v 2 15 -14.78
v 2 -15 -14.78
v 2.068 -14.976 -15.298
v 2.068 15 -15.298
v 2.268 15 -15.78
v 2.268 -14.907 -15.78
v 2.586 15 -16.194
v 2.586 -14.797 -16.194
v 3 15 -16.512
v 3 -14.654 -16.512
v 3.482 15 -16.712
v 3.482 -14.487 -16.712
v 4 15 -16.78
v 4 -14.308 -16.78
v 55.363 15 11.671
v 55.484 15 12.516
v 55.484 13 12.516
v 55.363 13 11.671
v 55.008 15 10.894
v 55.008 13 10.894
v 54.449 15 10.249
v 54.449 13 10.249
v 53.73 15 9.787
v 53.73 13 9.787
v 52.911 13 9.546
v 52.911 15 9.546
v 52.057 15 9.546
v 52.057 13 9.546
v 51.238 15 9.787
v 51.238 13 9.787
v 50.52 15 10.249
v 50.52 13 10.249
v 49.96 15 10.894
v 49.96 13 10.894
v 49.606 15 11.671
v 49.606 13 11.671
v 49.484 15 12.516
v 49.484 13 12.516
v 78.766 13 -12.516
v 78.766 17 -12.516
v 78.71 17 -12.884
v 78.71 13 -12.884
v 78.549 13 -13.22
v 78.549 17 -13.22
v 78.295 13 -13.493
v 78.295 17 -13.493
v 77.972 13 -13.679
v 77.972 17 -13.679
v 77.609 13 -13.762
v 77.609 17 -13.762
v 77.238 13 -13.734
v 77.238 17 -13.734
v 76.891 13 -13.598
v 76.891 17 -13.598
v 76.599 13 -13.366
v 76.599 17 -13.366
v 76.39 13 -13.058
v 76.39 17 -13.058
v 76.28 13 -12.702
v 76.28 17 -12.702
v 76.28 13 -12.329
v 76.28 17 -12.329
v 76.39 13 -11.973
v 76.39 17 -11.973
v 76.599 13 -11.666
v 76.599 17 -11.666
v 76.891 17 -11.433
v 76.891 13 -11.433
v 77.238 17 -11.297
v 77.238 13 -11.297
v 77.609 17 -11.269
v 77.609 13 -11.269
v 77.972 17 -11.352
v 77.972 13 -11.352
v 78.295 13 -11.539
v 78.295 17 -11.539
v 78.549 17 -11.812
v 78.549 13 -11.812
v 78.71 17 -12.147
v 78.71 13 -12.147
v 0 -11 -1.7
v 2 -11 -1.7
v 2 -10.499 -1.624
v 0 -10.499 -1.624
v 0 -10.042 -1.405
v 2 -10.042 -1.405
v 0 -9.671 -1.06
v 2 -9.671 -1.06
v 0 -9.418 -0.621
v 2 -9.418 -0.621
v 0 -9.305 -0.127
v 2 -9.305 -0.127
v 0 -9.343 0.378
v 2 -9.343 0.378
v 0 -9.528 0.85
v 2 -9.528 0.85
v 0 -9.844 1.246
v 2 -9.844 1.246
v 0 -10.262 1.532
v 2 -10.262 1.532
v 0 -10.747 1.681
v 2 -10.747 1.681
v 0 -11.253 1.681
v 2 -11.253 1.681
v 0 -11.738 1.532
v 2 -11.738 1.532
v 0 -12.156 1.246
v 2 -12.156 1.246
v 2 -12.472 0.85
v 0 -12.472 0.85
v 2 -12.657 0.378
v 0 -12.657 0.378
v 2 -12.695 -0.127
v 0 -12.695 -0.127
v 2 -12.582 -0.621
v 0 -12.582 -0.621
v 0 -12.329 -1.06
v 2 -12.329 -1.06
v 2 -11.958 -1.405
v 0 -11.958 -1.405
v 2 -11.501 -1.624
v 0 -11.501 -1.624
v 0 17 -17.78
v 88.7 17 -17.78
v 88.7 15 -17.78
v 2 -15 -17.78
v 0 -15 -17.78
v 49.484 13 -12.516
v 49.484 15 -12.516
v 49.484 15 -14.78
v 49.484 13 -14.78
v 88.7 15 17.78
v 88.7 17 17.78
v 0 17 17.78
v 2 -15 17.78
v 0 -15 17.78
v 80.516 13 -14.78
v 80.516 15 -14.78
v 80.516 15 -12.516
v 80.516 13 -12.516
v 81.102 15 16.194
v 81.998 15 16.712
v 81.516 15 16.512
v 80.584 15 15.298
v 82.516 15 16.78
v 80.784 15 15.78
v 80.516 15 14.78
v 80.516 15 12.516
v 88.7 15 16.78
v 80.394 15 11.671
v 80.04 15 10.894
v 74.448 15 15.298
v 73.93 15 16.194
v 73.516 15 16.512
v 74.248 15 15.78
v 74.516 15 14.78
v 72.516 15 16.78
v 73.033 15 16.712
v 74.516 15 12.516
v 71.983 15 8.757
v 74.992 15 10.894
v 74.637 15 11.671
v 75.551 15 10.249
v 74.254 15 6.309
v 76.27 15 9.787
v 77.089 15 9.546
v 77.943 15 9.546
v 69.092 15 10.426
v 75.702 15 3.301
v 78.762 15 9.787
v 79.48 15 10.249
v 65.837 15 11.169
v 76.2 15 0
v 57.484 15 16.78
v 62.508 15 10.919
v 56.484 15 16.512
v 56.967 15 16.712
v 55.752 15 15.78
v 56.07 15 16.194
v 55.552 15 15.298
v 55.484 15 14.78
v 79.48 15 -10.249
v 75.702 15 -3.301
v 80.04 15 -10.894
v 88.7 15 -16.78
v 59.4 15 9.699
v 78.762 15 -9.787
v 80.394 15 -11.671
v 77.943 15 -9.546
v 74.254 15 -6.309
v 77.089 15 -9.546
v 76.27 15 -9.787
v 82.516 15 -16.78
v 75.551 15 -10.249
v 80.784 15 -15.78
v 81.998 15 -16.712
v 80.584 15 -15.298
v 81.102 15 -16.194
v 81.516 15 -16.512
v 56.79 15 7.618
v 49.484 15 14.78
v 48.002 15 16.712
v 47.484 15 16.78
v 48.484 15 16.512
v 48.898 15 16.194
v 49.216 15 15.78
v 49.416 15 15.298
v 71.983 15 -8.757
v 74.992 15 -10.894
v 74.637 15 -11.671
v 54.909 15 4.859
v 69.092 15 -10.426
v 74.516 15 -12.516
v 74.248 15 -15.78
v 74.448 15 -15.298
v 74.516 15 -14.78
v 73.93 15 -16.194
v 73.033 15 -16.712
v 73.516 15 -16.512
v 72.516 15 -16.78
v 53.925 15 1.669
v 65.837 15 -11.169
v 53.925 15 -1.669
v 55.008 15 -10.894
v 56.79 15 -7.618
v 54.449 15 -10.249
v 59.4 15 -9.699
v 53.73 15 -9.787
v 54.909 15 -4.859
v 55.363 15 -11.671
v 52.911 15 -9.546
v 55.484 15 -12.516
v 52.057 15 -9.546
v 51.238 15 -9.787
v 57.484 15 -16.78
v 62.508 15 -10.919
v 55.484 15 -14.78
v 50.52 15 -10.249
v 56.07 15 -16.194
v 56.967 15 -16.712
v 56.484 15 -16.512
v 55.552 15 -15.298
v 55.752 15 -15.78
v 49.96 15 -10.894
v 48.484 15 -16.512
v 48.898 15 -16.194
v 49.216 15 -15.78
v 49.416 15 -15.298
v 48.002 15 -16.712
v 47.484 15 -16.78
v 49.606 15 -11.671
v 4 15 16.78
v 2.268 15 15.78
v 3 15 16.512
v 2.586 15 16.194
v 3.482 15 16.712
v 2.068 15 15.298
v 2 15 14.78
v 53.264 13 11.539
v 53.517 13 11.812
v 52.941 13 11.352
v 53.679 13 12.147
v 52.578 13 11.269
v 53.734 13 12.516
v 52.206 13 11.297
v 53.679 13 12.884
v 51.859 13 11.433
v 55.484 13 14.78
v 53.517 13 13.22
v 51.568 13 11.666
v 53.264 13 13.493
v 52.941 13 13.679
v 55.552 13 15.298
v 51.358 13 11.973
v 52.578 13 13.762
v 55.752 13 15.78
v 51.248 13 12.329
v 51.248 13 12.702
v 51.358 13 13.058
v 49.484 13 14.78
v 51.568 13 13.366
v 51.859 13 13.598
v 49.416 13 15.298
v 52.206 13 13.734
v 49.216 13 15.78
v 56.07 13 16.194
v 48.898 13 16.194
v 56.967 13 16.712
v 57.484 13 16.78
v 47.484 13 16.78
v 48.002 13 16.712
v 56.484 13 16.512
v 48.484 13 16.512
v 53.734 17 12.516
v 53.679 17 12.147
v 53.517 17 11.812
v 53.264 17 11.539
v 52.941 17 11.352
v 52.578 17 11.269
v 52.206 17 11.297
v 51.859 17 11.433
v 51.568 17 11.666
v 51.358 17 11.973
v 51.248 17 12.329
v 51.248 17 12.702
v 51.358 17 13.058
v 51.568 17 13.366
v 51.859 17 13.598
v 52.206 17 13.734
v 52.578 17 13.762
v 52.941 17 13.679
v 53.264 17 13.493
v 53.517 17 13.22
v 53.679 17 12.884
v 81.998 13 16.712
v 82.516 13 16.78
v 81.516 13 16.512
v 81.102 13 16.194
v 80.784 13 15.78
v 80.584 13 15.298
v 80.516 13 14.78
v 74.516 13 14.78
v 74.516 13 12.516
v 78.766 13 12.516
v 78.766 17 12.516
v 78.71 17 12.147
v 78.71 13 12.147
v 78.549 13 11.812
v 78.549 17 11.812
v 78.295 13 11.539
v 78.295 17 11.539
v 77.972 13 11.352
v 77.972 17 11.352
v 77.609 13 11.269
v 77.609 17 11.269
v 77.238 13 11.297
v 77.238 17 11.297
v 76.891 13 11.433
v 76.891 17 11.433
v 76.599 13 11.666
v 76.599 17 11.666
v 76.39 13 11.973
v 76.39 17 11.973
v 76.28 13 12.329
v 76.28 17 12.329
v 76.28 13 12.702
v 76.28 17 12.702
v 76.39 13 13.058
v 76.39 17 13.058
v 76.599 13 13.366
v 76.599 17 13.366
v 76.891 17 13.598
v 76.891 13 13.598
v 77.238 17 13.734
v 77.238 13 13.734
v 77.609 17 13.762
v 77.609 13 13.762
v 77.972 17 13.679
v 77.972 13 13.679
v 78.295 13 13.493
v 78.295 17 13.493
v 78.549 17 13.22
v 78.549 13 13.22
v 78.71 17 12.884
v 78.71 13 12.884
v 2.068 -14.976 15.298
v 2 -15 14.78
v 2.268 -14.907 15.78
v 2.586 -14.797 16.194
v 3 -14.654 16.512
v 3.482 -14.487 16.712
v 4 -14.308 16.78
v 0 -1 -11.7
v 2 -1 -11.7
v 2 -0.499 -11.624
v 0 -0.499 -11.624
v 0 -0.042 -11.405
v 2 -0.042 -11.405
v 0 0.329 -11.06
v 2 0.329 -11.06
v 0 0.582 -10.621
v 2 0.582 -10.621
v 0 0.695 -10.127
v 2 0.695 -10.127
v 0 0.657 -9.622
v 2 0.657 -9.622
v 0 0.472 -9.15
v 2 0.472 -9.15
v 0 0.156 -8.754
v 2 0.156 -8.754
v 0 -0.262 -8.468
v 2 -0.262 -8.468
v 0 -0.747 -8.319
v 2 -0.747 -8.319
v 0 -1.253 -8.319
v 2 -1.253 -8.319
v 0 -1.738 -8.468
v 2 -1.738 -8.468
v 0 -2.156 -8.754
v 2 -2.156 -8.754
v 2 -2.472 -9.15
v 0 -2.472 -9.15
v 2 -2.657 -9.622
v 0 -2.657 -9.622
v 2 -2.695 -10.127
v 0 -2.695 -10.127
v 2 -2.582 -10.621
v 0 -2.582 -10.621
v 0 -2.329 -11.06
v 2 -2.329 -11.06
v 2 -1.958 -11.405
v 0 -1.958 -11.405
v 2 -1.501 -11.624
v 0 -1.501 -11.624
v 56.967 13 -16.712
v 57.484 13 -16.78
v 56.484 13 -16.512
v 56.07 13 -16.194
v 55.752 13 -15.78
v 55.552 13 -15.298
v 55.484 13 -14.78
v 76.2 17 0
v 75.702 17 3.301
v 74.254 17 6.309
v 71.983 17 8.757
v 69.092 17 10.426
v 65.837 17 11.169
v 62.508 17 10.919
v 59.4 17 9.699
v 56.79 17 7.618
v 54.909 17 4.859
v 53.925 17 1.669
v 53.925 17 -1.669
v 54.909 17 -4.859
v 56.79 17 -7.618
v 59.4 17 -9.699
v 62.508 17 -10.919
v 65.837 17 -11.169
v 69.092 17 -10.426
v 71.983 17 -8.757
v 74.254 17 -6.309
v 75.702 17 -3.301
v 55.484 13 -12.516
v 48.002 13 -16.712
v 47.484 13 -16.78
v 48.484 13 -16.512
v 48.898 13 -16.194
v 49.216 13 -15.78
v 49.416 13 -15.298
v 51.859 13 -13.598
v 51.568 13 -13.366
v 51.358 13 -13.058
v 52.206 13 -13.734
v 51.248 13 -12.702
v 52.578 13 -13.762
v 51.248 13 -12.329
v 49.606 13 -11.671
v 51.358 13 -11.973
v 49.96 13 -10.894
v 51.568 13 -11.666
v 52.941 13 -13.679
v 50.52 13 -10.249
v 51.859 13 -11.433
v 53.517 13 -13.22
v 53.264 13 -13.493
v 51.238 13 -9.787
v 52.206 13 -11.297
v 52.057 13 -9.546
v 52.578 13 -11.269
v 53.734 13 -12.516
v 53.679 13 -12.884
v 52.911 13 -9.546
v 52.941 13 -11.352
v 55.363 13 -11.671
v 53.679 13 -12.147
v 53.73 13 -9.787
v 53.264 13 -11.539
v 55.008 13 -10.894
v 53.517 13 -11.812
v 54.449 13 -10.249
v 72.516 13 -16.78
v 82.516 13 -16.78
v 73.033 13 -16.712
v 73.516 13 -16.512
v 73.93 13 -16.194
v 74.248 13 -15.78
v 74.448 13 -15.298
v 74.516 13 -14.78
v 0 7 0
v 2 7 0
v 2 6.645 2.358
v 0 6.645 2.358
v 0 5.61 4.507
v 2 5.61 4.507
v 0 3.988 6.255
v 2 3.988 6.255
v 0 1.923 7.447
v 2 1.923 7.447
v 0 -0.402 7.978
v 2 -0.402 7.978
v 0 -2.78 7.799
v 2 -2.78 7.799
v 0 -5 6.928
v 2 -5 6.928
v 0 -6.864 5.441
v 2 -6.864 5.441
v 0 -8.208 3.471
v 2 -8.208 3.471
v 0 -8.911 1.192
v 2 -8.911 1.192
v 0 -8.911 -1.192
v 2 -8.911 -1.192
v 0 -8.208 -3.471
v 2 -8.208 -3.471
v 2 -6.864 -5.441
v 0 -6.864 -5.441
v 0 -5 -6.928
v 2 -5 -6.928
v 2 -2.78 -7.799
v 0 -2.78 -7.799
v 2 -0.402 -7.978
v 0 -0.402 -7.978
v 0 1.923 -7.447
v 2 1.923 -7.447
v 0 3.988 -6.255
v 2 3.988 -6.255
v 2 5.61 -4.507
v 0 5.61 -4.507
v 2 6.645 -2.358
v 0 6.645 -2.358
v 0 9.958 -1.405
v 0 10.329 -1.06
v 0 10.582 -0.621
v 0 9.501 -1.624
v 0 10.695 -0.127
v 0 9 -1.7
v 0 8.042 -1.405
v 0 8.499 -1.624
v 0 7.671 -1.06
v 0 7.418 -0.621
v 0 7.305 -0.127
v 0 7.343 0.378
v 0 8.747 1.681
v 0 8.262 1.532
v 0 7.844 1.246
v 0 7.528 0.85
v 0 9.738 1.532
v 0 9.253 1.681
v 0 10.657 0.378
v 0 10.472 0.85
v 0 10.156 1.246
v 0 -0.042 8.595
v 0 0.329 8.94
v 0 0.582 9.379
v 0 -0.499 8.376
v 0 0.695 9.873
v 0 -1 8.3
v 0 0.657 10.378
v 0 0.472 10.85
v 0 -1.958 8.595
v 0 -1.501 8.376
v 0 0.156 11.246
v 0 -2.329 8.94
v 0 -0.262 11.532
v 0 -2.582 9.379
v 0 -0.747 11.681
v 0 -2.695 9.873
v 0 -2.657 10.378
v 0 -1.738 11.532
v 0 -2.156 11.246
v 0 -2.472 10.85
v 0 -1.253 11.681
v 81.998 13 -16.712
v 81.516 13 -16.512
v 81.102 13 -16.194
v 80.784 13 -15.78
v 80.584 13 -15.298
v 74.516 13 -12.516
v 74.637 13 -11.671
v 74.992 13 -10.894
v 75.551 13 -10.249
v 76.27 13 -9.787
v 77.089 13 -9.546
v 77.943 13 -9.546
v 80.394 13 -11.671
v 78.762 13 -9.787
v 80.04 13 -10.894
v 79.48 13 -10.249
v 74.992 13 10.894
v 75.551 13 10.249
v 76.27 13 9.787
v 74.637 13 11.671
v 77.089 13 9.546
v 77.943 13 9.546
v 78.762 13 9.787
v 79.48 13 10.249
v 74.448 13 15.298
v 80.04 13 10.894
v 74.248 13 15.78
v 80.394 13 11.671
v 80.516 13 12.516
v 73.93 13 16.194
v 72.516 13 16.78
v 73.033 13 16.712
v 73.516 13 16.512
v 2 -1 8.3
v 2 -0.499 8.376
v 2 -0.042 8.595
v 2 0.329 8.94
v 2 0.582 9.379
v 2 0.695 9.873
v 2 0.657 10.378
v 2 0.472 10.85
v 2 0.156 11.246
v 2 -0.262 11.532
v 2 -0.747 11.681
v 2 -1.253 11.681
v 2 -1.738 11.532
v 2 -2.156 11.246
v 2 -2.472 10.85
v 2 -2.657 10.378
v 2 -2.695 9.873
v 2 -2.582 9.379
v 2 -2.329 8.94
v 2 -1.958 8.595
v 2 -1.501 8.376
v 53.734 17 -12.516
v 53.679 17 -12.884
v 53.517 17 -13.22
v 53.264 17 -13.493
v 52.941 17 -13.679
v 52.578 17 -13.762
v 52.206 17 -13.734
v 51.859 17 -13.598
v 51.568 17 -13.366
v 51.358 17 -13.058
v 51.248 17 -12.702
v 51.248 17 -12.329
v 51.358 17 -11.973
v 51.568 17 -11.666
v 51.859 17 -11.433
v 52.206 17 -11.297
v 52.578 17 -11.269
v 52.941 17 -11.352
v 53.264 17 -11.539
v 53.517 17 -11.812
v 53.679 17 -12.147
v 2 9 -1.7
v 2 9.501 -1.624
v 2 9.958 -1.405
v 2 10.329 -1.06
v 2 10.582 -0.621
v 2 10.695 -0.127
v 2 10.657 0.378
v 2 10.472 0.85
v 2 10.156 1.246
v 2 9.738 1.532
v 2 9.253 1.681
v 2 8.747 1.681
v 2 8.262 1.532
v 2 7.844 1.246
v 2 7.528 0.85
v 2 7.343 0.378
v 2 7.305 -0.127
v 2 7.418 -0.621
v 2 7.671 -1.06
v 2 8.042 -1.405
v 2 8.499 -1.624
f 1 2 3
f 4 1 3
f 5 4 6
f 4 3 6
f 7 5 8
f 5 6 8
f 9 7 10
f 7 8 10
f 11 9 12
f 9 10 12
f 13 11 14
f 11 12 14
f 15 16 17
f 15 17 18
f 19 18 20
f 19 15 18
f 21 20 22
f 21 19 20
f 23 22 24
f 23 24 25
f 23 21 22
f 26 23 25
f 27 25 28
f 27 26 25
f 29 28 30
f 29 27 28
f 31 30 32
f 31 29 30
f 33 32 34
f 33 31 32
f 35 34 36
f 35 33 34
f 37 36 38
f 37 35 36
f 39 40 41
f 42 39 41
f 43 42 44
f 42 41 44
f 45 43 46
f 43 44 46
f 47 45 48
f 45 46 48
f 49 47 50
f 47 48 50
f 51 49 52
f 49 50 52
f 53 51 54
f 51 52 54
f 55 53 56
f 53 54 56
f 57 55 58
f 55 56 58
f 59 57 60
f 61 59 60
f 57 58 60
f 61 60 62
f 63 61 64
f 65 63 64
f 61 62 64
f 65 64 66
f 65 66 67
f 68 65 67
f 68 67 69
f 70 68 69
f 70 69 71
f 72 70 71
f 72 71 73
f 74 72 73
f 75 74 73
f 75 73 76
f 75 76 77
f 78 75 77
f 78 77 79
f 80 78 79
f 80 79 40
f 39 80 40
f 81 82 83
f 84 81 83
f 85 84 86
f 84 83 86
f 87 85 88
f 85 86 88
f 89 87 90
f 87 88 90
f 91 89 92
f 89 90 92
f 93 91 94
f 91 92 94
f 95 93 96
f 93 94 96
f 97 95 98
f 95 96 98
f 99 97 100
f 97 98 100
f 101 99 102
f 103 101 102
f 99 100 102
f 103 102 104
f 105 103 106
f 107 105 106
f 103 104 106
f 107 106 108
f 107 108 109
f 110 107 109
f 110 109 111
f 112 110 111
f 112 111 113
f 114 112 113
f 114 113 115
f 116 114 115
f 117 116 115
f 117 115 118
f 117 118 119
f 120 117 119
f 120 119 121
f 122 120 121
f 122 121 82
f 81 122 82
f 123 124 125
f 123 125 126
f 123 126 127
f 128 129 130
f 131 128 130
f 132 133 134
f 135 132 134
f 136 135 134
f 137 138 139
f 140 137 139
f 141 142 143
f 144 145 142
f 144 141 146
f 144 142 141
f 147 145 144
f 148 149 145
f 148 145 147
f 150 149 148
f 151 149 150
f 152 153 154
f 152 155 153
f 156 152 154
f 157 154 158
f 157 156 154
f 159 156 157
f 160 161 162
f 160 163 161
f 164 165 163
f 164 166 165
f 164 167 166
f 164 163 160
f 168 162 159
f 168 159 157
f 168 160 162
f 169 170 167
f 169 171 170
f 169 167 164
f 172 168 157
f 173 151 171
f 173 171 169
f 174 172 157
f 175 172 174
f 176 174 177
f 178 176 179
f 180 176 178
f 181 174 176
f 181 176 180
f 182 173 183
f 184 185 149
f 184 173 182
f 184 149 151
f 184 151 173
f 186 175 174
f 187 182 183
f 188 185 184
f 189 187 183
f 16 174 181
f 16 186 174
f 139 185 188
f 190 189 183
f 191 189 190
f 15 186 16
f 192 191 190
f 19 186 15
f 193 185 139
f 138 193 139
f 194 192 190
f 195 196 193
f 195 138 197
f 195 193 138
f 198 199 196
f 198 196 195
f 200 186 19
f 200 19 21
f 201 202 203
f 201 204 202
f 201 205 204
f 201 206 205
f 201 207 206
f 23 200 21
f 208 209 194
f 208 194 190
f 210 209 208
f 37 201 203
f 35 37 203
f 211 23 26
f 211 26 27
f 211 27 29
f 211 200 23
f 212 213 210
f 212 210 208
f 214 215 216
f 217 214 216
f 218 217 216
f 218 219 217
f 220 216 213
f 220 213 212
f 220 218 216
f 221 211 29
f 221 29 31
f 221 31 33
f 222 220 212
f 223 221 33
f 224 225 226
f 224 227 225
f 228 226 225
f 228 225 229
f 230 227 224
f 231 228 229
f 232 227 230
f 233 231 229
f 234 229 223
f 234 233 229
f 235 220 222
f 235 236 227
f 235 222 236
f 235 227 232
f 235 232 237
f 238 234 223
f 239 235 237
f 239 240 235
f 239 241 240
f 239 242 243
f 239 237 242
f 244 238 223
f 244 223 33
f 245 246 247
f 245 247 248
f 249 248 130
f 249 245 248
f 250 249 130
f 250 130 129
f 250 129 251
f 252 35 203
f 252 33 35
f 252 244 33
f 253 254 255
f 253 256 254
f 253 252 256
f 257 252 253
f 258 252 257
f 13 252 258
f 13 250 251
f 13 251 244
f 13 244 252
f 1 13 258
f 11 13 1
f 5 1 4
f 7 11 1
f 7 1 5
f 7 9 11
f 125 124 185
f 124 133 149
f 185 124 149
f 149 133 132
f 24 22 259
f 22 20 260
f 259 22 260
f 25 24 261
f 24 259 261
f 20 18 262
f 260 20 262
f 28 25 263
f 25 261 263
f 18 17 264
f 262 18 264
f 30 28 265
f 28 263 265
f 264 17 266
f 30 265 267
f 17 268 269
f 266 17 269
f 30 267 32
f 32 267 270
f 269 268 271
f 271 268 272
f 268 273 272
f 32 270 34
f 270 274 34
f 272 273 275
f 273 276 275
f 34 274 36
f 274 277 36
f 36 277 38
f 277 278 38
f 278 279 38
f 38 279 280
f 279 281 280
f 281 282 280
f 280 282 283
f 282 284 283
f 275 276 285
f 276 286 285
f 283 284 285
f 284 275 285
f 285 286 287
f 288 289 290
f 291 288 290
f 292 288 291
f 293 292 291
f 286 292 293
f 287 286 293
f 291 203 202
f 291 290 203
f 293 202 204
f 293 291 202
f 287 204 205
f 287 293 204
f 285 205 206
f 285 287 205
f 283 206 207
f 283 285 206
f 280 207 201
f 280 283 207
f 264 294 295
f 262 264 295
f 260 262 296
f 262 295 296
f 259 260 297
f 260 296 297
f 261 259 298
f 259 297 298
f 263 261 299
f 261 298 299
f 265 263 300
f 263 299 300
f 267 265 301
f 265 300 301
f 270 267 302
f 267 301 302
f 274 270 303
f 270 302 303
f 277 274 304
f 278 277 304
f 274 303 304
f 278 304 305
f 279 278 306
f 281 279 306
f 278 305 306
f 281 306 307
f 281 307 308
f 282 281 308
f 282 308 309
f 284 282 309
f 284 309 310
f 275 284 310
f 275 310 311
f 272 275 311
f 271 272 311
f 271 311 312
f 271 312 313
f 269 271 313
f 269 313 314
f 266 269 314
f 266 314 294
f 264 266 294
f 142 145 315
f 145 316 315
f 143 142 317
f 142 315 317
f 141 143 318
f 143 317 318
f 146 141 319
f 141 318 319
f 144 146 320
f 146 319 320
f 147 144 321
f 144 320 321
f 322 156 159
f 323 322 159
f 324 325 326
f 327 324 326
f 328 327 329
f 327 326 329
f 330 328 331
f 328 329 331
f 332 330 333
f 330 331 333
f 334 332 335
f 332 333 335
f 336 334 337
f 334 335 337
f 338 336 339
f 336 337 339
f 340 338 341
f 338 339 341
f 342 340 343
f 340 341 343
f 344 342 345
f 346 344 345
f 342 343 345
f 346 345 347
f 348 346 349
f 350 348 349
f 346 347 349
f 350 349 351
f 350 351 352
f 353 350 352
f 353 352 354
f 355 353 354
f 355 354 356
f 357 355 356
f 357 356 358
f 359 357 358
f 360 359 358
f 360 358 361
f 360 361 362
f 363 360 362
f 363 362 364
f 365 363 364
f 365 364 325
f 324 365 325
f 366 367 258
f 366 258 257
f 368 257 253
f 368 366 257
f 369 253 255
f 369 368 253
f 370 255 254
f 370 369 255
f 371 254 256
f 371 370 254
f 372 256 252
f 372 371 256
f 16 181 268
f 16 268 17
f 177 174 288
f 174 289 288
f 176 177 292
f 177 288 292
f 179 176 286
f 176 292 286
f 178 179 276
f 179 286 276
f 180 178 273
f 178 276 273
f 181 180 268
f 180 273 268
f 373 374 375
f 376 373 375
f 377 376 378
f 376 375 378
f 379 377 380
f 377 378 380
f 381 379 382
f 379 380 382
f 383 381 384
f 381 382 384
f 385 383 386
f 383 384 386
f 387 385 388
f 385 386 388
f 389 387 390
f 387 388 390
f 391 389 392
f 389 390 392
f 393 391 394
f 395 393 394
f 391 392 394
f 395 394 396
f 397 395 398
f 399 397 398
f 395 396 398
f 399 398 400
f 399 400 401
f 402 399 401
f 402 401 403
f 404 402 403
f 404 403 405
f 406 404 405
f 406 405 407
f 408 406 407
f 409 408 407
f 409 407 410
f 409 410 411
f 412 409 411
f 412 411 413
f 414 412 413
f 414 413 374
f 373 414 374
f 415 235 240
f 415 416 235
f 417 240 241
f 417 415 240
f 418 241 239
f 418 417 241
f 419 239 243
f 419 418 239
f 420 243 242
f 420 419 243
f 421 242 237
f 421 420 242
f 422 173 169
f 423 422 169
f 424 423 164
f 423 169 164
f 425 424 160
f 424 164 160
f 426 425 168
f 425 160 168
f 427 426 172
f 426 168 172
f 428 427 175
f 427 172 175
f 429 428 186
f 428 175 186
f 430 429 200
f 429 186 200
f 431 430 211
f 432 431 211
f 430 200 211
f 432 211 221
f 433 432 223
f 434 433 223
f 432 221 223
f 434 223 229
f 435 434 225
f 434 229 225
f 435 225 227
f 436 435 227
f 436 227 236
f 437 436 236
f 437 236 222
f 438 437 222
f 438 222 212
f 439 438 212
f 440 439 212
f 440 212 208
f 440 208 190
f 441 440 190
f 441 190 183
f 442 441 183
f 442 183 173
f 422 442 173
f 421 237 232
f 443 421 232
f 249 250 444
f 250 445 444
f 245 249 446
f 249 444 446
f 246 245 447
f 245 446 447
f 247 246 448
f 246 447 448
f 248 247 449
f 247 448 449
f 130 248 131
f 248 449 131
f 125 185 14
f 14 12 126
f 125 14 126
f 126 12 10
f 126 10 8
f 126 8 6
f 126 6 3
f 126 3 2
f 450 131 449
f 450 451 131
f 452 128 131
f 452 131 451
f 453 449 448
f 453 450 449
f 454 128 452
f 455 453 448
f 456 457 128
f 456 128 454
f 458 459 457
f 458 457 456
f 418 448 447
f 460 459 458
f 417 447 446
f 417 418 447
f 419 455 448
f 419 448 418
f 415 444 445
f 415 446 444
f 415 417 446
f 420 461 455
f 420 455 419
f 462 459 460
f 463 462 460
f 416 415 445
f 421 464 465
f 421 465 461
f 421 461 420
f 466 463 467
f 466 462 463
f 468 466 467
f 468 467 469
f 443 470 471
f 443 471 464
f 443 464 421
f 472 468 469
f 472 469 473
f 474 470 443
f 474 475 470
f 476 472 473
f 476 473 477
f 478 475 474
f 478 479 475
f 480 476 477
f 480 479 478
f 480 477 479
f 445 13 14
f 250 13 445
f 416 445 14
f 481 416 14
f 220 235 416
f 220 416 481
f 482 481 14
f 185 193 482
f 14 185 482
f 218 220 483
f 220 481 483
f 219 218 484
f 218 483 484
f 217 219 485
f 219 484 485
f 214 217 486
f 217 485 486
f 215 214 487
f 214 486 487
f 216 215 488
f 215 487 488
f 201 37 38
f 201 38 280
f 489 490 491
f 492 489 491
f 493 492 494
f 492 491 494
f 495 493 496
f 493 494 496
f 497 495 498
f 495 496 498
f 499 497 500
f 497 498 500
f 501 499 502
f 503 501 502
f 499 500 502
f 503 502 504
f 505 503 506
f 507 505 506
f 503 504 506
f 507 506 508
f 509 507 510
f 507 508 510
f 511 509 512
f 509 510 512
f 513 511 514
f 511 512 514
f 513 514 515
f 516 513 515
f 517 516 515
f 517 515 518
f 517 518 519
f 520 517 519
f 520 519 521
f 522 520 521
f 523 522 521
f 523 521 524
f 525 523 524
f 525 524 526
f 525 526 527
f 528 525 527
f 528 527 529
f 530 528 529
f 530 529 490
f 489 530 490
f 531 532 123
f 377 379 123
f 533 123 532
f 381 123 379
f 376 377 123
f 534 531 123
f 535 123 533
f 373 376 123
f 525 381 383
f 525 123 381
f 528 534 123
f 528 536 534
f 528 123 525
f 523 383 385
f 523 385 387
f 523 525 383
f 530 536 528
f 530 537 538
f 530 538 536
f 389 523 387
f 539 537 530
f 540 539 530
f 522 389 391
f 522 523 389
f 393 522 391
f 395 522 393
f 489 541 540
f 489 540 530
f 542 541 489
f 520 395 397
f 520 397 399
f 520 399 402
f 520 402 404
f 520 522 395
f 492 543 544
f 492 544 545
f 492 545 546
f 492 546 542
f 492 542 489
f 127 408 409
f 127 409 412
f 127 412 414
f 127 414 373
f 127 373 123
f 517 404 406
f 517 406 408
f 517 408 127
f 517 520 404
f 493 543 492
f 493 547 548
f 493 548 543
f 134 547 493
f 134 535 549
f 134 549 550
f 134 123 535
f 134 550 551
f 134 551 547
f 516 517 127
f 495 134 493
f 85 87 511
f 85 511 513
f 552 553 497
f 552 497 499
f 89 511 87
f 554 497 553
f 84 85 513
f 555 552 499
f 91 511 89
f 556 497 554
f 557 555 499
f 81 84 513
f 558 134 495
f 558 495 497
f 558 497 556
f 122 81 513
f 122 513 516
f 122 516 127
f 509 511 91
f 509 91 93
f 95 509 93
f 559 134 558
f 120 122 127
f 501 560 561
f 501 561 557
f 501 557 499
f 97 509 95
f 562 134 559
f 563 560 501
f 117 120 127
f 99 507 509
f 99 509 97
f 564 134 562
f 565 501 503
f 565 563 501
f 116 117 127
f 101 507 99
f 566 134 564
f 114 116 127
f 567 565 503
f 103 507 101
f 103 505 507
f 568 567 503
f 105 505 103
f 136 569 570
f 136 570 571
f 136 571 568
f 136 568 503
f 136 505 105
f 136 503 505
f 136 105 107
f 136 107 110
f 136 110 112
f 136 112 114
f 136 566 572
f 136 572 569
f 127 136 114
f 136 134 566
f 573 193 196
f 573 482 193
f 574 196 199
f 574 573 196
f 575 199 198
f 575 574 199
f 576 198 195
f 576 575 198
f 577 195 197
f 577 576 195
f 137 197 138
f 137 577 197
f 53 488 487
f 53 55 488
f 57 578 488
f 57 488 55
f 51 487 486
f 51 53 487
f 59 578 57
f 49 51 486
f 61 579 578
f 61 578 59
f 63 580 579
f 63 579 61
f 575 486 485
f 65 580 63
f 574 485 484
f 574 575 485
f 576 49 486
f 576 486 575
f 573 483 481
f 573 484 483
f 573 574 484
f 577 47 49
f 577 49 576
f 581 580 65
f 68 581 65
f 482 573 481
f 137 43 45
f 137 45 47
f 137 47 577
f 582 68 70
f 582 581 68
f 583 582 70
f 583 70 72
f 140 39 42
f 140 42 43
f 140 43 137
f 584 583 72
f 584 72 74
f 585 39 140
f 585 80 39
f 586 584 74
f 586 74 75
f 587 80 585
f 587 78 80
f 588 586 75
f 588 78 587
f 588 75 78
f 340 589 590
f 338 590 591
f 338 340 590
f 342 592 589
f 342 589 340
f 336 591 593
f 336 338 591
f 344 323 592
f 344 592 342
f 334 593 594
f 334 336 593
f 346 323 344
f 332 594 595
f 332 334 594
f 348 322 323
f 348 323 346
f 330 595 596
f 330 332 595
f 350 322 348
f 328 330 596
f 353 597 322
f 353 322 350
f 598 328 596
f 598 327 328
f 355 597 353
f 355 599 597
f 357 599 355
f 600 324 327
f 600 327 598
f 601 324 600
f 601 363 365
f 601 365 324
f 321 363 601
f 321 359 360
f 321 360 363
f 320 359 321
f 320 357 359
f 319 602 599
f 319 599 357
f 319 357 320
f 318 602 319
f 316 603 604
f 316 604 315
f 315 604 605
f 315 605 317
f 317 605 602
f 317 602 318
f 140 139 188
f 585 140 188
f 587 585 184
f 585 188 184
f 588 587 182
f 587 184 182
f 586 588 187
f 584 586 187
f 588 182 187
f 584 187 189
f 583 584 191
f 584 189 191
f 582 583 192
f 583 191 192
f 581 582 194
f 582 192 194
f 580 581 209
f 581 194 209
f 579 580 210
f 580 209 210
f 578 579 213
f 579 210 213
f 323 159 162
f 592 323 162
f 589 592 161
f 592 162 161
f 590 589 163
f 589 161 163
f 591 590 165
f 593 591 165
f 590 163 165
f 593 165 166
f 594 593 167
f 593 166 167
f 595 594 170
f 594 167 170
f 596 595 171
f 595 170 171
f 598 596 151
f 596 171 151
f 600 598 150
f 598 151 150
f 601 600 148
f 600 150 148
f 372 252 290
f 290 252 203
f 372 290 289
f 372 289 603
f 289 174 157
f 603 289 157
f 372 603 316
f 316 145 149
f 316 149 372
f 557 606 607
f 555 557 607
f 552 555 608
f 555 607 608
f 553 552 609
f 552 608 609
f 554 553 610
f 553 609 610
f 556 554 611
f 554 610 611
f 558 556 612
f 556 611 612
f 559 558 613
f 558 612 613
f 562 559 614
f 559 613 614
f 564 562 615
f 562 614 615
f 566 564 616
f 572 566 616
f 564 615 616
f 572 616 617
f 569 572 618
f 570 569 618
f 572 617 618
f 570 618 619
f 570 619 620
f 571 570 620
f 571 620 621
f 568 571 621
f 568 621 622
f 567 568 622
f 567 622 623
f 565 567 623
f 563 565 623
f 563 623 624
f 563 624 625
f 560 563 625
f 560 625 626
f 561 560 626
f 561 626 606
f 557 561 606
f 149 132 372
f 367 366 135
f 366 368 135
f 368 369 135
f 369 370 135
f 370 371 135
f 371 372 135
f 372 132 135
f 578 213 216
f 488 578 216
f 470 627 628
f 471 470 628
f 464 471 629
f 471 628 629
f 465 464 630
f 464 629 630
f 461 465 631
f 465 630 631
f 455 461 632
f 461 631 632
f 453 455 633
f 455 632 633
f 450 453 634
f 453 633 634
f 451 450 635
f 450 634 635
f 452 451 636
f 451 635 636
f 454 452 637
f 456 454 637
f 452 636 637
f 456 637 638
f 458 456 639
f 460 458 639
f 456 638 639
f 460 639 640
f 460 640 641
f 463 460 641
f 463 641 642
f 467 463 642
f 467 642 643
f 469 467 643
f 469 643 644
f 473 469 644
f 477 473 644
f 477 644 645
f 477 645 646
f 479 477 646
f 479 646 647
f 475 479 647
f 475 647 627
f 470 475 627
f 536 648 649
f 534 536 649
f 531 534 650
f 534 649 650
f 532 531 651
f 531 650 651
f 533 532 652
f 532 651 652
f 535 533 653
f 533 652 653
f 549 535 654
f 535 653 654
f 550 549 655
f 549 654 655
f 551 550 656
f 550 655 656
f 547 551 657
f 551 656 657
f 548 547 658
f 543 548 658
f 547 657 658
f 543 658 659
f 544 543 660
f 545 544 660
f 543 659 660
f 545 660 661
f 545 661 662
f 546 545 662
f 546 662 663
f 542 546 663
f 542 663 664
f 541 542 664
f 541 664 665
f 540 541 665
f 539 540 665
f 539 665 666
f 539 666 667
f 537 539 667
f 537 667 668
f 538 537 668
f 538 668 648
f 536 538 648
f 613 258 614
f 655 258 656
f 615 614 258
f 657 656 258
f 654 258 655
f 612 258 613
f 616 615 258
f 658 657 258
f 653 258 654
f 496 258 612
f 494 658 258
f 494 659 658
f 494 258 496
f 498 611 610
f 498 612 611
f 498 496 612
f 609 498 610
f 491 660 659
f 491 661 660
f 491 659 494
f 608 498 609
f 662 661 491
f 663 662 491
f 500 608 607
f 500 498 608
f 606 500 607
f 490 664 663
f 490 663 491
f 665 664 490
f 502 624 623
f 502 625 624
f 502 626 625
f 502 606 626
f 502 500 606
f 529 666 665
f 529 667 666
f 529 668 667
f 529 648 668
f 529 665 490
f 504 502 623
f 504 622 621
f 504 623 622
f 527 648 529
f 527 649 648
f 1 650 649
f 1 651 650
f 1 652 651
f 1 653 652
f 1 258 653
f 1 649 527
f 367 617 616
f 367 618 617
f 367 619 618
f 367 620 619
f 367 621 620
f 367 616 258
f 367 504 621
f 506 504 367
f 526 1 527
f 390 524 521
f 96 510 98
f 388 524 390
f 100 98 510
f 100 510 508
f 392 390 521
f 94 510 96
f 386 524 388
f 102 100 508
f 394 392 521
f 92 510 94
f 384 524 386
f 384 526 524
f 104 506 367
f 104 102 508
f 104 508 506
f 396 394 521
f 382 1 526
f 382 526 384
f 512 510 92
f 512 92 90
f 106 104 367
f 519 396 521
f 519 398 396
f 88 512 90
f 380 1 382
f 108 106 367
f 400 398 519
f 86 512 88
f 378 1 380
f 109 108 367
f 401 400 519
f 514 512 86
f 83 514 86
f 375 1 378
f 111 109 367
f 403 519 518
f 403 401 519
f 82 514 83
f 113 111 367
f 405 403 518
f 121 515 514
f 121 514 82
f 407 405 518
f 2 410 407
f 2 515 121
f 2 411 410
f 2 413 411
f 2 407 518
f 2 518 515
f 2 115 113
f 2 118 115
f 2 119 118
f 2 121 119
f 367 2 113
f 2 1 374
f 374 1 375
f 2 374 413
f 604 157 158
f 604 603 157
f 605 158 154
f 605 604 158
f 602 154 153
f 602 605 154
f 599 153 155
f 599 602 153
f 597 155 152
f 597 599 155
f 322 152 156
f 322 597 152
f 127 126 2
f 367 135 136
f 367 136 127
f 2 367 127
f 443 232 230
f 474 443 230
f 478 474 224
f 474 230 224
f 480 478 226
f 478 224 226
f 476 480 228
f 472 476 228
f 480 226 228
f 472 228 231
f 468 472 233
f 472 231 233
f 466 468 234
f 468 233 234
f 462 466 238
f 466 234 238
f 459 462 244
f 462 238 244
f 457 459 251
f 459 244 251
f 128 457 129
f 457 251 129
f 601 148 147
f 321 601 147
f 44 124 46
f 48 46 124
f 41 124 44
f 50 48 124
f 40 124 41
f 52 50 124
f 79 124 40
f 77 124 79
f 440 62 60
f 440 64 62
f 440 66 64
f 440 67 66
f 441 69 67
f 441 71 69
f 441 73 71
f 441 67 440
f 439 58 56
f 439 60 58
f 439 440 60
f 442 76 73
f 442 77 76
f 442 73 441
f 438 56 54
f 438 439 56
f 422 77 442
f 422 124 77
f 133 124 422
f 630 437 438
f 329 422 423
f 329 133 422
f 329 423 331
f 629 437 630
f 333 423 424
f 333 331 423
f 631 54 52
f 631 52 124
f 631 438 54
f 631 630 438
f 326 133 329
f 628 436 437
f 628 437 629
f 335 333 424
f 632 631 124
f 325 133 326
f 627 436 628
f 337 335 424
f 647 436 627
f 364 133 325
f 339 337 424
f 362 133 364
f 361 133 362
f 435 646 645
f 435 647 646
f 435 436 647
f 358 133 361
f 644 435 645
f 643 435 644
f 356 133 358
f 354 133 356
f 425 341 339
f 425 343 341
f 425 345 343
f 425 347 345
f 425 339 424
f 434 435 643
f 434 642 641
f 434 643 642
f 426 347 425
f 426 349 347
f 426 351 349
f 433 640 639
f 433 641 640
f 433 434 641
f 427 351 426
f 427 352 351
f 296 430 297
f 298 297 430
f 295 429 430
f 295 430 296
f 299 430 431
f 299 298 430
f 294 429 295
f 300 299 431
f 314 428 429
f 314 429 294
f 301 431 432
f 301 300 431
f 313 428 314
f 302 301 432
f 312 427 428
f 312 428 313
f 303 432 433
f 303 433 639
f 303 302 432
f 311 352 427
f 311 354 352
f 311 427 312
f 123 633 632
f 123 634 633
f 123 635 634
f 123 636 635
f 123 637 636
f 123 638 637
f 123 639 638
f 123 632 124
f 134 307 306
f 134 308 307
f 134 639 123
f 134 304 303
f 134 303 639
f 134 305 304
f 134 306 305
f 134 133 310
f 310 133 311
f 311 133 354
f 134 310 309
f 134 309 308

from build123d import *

# Parameters (mm, degrees)
BOSS_EXTRUDE1_DEPTH       = 17.78
CUT_EXTRUDE1_DEPTH        = 16.78
CUT_EXTRUDE1_DEPTH_BACK   = 16.78
SKETCH4_R                 = 8
CUT_EXTRUDE2_DEPTH        = 91.122241428
SKETCH5_R                 = 11.2
CUT_EXTRUDE3_DEPTH        = 96.309067774
BOSS_EXTRUDE2_DEPTH       = 2
M3X0_5_TAPPED_HOLE2_D     = 2.5
M3X0_5_TAPPED_HOLE2_DEPTH = 7.5
M3X0_5_TAPPED_HOLE2_TIP   = 0.751075774
FILLET6_R                 = 2
M3_CLEARANCE_HOLE1_D      = 3.4
M3_CLEARANCE_HOLE1_DEPTH  = 12.7


with BuildPart() as part:
    # Sketch1 → Boss-Extrude1 (new, symmetric)
    with BuildSketch(Plane.XY):
        Polygon((0, -15), (0, 15), (0, 17), (2, 17), (88.7, 17), (88.7, 15), (2, -15), align=None)
    extrude(amount=BOSS_EXTRUDE1_DEPTH, both=True)

    # Sketch2 → Cut-Extrude1 (cut, two sides: drawn at the far end of the back side and taken through both)
    with BuildSketch(Plane.XY.offset(-CUT_EXTRUDE1_DEPTH_BACK)):
        Polygon((2, 15), (2, -15), (88.7, 15), align=None)
    extrude(amount=CUT_EXTRUDE1_DEPTH + CUT_EXTRUDE1_DEPTH_BACK, mode=Mode.SUBTRACT)

    # Sketch4 → Cut-Extrude2 (cut, through all)
    with BuildSketch(Plane(origin=(2, 0, 0), x_dir=(0, 0, -1), z_dir=(1, 0, 0))):
        with Locations(Location((0, -1, 0), (0, 0, 90))):
            Circle(SKETCH4_R)
    extrude(amount=-CUT_EXTRUDE2_DEPTH, mode=Mode.SUBTRACT)

    # Sketch5 → Cut-Extrude3 (cut, through all)
    with BuildSketch(Plane.XZ.offset(-15)):
        with Locations((65, 0)):
            Circle(SKETCH5_R)
    extrude(amount=-CUT_EXTRUDE3_DEPTH, mode=Mode.SUBTRACT)

    # Sketch7 → Boss-Extrude2 (add)
    with BuildSketch(Plane.XZ.offset(-15)):
        with BuildLine():
            Line((49.484209973, -12.515790027), (49.484209973, -16.78))
            Line((49.484209973, -16.78), (55.484209973, -16.78))
            Line((55.484209973, -16.78), (55.484209973, -12.515790027))
            ThreePointArc((55.484209973, -12.515790027), (52.484209973, -9.515790027), (49.484209973, -12.515790027))
        make_face()
        with BuildLine():
            Line((74.515790027, -12.515790027), (74.515790027, -16.78))
            Line((74.515790027, -16.78), (80.515790027, -16.78))
            Line((80.515790027, -16.78), (80.515790027, -12.515790027))
            ThreePointArc((80.515790027, -12.515790027), (77.515790027, -9.515790027), (74.515790027, -12.515790027))
        make_face()
        with BuildLine():
            Line((80.515790027, 12.515790027), (80.515790027, 16.78))
            Line((80.515790027, 16.78), (74.515790027, 16.78))
            Line((74.515790027, 16.78), (74.515790027, 12.515790027))
            ThreePointArc((74.515790027, 12.515790027), (77.515790027, 9.515790027), (80.515790027, 12.515790027))
        make_face()
        with BuildLine():
            Line((49.484209973, 12.515790027), (49.484209973, 16.78))
            Line((49.484209973, 16.78), (55.484209973, 16.78))
            Line((55.484209973, 16.78), (55.484209973, 12.515790027))
            ThreePointArc((55.484209973, 12.515790027), (52.484209973, 9.515790027), (49.484209973, 12.515790027))
        make_face()
    extrude(amount=BOSS_EXTRUDE2_DEPTH)

    # M3x0.5 Tapped Hole2
    with Locations(Plane(origin=(0, 13, 0), x_dir=(-1, 0, 0), z_dir=(0, -1, 0))):
        with Locations((-52.484209973, -12.515790027), (-77.515790027, -12.515790027), (-77.515790027, 12.515790027), (-52.484209973, 12.515790027)):
            Hole(M3X0_5_TAPPED_HOLE2_D / 2, depth=M3X0_5_TAPPED_HOLE2_DEPTH)
            with Locations((0, 0, -(M3X0_5_TAPPED_HOLE2_DEPTH + M3X0_5_TAPPED_HOLE2_TIP / 2))):  # 118° drill point
                Cone(0, M3X0_5_TAPPED_HOLE2_D / 2, M3X0_5_TAPPED_HOLE2_TIP, mode=Mode.SUBTRACT)

    # Fillet6
    fillet6_edges = [part.edges().sort_by_distance(p)[0] for p in [
        (2, 0, -16.78),
        (2, 0, 16.78),
        (49.484209973, 14, -16.78),
        (55.484209973, 14, -16.78),
        (74.515790027, 14, -16.78),
        (80.515790027, 14, -16.78),
        (80.515790027, 14, 16.78),
        (74.515790027, 14, 16.78),
        (55.484209973, 14, 16.78),
        (49.484209973, 14, 16.78),
    ]]
    fillet(fillet6_edges, radius=FILLET6_R)

    # M3 Clearance Hole1
    with Locations(Plane.ZY):
        with Locations((0, 9), (10, -1), (0, -11), (-10, -1)):
            Hole(M3_CLEARANCE_HOLE1_D / 2, depth=M3_CLEARANCE_HOLE1_DEPTH)


solid = part.part
